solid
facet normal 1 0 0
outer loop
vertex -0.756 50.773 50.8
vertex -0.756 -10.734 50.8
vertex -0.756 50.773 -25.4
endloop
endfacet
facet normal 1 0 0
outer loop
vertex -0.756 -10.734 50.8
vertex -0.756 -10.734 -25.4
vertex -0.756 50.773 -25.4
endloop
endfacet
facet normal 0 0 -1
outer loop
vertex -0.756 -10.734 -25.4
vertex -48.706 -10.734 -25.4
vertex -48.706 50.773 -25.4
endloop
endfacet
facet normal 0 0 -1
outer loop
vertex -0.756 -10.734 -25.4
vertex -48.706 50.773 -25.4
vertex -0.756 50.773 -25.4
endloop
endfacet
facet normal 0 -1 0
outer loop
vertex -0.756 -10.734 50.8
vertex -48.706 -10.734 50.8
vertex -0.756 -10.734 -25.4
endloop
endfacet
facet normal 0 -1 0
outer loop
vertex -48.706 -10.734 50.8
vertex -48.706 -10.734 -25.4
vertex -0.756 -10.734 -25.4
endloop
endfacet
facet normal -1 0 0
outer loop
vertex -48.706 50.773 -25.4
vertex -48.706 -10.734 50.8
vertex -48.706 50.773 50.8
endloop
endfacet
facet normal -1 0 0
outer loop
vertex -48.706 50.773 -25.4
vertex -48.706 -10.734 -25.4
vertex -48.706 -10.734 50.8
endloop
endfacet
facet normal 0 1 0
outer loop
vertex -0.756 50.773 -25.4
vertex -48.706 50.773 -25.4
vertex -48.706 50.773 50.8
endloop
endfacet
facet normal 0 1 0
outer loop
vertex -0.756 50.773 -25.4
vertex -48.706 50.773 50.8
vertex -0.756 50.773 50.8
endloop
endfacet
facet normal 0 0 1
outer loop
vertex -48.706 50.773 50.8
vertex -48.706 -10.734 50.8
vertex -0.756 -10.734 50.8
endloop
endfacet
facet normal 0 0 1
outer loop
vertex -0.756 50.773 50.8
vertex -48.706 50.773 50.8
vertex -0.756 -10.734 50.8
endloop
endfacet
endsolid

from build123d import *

# Parameters (mm, degrees)
F0_W     = 47.950342414
F0_H     = 36.107186228
F1_DEPTH = 25.4
F2_DEPTH = 25.4
F4_DEPTH = 50.8


with BuildPart() as f1:
    # F0 (on Top) → F1 (new body)
    with BuildSketch(Plane.XY):
        with Locations((-24.7308834805, 32.7199045569)):
            Rectangle(F0_W, F0_H)
    extrude(amount=-F1_DEPTH)

    # F2 (add): a face of the model
    f2_faces = [f1.faces().sort_by_distance(p)[0] for p in [
        (-24.7308834805, 14.6663114429, -12.7),
    ]]
    extrude(f2_faces, amount=F2_DEPTH)

    # F4 (add): a face of the model
    f4_faces = [f1.faces().sort_by_distance(p)[0] for p in [
        (-24.7308834805, 20.0199045569, 0),
    ]]
    extrude(f4_faces, amount=F4_DEPTH)


solid = f1.part
